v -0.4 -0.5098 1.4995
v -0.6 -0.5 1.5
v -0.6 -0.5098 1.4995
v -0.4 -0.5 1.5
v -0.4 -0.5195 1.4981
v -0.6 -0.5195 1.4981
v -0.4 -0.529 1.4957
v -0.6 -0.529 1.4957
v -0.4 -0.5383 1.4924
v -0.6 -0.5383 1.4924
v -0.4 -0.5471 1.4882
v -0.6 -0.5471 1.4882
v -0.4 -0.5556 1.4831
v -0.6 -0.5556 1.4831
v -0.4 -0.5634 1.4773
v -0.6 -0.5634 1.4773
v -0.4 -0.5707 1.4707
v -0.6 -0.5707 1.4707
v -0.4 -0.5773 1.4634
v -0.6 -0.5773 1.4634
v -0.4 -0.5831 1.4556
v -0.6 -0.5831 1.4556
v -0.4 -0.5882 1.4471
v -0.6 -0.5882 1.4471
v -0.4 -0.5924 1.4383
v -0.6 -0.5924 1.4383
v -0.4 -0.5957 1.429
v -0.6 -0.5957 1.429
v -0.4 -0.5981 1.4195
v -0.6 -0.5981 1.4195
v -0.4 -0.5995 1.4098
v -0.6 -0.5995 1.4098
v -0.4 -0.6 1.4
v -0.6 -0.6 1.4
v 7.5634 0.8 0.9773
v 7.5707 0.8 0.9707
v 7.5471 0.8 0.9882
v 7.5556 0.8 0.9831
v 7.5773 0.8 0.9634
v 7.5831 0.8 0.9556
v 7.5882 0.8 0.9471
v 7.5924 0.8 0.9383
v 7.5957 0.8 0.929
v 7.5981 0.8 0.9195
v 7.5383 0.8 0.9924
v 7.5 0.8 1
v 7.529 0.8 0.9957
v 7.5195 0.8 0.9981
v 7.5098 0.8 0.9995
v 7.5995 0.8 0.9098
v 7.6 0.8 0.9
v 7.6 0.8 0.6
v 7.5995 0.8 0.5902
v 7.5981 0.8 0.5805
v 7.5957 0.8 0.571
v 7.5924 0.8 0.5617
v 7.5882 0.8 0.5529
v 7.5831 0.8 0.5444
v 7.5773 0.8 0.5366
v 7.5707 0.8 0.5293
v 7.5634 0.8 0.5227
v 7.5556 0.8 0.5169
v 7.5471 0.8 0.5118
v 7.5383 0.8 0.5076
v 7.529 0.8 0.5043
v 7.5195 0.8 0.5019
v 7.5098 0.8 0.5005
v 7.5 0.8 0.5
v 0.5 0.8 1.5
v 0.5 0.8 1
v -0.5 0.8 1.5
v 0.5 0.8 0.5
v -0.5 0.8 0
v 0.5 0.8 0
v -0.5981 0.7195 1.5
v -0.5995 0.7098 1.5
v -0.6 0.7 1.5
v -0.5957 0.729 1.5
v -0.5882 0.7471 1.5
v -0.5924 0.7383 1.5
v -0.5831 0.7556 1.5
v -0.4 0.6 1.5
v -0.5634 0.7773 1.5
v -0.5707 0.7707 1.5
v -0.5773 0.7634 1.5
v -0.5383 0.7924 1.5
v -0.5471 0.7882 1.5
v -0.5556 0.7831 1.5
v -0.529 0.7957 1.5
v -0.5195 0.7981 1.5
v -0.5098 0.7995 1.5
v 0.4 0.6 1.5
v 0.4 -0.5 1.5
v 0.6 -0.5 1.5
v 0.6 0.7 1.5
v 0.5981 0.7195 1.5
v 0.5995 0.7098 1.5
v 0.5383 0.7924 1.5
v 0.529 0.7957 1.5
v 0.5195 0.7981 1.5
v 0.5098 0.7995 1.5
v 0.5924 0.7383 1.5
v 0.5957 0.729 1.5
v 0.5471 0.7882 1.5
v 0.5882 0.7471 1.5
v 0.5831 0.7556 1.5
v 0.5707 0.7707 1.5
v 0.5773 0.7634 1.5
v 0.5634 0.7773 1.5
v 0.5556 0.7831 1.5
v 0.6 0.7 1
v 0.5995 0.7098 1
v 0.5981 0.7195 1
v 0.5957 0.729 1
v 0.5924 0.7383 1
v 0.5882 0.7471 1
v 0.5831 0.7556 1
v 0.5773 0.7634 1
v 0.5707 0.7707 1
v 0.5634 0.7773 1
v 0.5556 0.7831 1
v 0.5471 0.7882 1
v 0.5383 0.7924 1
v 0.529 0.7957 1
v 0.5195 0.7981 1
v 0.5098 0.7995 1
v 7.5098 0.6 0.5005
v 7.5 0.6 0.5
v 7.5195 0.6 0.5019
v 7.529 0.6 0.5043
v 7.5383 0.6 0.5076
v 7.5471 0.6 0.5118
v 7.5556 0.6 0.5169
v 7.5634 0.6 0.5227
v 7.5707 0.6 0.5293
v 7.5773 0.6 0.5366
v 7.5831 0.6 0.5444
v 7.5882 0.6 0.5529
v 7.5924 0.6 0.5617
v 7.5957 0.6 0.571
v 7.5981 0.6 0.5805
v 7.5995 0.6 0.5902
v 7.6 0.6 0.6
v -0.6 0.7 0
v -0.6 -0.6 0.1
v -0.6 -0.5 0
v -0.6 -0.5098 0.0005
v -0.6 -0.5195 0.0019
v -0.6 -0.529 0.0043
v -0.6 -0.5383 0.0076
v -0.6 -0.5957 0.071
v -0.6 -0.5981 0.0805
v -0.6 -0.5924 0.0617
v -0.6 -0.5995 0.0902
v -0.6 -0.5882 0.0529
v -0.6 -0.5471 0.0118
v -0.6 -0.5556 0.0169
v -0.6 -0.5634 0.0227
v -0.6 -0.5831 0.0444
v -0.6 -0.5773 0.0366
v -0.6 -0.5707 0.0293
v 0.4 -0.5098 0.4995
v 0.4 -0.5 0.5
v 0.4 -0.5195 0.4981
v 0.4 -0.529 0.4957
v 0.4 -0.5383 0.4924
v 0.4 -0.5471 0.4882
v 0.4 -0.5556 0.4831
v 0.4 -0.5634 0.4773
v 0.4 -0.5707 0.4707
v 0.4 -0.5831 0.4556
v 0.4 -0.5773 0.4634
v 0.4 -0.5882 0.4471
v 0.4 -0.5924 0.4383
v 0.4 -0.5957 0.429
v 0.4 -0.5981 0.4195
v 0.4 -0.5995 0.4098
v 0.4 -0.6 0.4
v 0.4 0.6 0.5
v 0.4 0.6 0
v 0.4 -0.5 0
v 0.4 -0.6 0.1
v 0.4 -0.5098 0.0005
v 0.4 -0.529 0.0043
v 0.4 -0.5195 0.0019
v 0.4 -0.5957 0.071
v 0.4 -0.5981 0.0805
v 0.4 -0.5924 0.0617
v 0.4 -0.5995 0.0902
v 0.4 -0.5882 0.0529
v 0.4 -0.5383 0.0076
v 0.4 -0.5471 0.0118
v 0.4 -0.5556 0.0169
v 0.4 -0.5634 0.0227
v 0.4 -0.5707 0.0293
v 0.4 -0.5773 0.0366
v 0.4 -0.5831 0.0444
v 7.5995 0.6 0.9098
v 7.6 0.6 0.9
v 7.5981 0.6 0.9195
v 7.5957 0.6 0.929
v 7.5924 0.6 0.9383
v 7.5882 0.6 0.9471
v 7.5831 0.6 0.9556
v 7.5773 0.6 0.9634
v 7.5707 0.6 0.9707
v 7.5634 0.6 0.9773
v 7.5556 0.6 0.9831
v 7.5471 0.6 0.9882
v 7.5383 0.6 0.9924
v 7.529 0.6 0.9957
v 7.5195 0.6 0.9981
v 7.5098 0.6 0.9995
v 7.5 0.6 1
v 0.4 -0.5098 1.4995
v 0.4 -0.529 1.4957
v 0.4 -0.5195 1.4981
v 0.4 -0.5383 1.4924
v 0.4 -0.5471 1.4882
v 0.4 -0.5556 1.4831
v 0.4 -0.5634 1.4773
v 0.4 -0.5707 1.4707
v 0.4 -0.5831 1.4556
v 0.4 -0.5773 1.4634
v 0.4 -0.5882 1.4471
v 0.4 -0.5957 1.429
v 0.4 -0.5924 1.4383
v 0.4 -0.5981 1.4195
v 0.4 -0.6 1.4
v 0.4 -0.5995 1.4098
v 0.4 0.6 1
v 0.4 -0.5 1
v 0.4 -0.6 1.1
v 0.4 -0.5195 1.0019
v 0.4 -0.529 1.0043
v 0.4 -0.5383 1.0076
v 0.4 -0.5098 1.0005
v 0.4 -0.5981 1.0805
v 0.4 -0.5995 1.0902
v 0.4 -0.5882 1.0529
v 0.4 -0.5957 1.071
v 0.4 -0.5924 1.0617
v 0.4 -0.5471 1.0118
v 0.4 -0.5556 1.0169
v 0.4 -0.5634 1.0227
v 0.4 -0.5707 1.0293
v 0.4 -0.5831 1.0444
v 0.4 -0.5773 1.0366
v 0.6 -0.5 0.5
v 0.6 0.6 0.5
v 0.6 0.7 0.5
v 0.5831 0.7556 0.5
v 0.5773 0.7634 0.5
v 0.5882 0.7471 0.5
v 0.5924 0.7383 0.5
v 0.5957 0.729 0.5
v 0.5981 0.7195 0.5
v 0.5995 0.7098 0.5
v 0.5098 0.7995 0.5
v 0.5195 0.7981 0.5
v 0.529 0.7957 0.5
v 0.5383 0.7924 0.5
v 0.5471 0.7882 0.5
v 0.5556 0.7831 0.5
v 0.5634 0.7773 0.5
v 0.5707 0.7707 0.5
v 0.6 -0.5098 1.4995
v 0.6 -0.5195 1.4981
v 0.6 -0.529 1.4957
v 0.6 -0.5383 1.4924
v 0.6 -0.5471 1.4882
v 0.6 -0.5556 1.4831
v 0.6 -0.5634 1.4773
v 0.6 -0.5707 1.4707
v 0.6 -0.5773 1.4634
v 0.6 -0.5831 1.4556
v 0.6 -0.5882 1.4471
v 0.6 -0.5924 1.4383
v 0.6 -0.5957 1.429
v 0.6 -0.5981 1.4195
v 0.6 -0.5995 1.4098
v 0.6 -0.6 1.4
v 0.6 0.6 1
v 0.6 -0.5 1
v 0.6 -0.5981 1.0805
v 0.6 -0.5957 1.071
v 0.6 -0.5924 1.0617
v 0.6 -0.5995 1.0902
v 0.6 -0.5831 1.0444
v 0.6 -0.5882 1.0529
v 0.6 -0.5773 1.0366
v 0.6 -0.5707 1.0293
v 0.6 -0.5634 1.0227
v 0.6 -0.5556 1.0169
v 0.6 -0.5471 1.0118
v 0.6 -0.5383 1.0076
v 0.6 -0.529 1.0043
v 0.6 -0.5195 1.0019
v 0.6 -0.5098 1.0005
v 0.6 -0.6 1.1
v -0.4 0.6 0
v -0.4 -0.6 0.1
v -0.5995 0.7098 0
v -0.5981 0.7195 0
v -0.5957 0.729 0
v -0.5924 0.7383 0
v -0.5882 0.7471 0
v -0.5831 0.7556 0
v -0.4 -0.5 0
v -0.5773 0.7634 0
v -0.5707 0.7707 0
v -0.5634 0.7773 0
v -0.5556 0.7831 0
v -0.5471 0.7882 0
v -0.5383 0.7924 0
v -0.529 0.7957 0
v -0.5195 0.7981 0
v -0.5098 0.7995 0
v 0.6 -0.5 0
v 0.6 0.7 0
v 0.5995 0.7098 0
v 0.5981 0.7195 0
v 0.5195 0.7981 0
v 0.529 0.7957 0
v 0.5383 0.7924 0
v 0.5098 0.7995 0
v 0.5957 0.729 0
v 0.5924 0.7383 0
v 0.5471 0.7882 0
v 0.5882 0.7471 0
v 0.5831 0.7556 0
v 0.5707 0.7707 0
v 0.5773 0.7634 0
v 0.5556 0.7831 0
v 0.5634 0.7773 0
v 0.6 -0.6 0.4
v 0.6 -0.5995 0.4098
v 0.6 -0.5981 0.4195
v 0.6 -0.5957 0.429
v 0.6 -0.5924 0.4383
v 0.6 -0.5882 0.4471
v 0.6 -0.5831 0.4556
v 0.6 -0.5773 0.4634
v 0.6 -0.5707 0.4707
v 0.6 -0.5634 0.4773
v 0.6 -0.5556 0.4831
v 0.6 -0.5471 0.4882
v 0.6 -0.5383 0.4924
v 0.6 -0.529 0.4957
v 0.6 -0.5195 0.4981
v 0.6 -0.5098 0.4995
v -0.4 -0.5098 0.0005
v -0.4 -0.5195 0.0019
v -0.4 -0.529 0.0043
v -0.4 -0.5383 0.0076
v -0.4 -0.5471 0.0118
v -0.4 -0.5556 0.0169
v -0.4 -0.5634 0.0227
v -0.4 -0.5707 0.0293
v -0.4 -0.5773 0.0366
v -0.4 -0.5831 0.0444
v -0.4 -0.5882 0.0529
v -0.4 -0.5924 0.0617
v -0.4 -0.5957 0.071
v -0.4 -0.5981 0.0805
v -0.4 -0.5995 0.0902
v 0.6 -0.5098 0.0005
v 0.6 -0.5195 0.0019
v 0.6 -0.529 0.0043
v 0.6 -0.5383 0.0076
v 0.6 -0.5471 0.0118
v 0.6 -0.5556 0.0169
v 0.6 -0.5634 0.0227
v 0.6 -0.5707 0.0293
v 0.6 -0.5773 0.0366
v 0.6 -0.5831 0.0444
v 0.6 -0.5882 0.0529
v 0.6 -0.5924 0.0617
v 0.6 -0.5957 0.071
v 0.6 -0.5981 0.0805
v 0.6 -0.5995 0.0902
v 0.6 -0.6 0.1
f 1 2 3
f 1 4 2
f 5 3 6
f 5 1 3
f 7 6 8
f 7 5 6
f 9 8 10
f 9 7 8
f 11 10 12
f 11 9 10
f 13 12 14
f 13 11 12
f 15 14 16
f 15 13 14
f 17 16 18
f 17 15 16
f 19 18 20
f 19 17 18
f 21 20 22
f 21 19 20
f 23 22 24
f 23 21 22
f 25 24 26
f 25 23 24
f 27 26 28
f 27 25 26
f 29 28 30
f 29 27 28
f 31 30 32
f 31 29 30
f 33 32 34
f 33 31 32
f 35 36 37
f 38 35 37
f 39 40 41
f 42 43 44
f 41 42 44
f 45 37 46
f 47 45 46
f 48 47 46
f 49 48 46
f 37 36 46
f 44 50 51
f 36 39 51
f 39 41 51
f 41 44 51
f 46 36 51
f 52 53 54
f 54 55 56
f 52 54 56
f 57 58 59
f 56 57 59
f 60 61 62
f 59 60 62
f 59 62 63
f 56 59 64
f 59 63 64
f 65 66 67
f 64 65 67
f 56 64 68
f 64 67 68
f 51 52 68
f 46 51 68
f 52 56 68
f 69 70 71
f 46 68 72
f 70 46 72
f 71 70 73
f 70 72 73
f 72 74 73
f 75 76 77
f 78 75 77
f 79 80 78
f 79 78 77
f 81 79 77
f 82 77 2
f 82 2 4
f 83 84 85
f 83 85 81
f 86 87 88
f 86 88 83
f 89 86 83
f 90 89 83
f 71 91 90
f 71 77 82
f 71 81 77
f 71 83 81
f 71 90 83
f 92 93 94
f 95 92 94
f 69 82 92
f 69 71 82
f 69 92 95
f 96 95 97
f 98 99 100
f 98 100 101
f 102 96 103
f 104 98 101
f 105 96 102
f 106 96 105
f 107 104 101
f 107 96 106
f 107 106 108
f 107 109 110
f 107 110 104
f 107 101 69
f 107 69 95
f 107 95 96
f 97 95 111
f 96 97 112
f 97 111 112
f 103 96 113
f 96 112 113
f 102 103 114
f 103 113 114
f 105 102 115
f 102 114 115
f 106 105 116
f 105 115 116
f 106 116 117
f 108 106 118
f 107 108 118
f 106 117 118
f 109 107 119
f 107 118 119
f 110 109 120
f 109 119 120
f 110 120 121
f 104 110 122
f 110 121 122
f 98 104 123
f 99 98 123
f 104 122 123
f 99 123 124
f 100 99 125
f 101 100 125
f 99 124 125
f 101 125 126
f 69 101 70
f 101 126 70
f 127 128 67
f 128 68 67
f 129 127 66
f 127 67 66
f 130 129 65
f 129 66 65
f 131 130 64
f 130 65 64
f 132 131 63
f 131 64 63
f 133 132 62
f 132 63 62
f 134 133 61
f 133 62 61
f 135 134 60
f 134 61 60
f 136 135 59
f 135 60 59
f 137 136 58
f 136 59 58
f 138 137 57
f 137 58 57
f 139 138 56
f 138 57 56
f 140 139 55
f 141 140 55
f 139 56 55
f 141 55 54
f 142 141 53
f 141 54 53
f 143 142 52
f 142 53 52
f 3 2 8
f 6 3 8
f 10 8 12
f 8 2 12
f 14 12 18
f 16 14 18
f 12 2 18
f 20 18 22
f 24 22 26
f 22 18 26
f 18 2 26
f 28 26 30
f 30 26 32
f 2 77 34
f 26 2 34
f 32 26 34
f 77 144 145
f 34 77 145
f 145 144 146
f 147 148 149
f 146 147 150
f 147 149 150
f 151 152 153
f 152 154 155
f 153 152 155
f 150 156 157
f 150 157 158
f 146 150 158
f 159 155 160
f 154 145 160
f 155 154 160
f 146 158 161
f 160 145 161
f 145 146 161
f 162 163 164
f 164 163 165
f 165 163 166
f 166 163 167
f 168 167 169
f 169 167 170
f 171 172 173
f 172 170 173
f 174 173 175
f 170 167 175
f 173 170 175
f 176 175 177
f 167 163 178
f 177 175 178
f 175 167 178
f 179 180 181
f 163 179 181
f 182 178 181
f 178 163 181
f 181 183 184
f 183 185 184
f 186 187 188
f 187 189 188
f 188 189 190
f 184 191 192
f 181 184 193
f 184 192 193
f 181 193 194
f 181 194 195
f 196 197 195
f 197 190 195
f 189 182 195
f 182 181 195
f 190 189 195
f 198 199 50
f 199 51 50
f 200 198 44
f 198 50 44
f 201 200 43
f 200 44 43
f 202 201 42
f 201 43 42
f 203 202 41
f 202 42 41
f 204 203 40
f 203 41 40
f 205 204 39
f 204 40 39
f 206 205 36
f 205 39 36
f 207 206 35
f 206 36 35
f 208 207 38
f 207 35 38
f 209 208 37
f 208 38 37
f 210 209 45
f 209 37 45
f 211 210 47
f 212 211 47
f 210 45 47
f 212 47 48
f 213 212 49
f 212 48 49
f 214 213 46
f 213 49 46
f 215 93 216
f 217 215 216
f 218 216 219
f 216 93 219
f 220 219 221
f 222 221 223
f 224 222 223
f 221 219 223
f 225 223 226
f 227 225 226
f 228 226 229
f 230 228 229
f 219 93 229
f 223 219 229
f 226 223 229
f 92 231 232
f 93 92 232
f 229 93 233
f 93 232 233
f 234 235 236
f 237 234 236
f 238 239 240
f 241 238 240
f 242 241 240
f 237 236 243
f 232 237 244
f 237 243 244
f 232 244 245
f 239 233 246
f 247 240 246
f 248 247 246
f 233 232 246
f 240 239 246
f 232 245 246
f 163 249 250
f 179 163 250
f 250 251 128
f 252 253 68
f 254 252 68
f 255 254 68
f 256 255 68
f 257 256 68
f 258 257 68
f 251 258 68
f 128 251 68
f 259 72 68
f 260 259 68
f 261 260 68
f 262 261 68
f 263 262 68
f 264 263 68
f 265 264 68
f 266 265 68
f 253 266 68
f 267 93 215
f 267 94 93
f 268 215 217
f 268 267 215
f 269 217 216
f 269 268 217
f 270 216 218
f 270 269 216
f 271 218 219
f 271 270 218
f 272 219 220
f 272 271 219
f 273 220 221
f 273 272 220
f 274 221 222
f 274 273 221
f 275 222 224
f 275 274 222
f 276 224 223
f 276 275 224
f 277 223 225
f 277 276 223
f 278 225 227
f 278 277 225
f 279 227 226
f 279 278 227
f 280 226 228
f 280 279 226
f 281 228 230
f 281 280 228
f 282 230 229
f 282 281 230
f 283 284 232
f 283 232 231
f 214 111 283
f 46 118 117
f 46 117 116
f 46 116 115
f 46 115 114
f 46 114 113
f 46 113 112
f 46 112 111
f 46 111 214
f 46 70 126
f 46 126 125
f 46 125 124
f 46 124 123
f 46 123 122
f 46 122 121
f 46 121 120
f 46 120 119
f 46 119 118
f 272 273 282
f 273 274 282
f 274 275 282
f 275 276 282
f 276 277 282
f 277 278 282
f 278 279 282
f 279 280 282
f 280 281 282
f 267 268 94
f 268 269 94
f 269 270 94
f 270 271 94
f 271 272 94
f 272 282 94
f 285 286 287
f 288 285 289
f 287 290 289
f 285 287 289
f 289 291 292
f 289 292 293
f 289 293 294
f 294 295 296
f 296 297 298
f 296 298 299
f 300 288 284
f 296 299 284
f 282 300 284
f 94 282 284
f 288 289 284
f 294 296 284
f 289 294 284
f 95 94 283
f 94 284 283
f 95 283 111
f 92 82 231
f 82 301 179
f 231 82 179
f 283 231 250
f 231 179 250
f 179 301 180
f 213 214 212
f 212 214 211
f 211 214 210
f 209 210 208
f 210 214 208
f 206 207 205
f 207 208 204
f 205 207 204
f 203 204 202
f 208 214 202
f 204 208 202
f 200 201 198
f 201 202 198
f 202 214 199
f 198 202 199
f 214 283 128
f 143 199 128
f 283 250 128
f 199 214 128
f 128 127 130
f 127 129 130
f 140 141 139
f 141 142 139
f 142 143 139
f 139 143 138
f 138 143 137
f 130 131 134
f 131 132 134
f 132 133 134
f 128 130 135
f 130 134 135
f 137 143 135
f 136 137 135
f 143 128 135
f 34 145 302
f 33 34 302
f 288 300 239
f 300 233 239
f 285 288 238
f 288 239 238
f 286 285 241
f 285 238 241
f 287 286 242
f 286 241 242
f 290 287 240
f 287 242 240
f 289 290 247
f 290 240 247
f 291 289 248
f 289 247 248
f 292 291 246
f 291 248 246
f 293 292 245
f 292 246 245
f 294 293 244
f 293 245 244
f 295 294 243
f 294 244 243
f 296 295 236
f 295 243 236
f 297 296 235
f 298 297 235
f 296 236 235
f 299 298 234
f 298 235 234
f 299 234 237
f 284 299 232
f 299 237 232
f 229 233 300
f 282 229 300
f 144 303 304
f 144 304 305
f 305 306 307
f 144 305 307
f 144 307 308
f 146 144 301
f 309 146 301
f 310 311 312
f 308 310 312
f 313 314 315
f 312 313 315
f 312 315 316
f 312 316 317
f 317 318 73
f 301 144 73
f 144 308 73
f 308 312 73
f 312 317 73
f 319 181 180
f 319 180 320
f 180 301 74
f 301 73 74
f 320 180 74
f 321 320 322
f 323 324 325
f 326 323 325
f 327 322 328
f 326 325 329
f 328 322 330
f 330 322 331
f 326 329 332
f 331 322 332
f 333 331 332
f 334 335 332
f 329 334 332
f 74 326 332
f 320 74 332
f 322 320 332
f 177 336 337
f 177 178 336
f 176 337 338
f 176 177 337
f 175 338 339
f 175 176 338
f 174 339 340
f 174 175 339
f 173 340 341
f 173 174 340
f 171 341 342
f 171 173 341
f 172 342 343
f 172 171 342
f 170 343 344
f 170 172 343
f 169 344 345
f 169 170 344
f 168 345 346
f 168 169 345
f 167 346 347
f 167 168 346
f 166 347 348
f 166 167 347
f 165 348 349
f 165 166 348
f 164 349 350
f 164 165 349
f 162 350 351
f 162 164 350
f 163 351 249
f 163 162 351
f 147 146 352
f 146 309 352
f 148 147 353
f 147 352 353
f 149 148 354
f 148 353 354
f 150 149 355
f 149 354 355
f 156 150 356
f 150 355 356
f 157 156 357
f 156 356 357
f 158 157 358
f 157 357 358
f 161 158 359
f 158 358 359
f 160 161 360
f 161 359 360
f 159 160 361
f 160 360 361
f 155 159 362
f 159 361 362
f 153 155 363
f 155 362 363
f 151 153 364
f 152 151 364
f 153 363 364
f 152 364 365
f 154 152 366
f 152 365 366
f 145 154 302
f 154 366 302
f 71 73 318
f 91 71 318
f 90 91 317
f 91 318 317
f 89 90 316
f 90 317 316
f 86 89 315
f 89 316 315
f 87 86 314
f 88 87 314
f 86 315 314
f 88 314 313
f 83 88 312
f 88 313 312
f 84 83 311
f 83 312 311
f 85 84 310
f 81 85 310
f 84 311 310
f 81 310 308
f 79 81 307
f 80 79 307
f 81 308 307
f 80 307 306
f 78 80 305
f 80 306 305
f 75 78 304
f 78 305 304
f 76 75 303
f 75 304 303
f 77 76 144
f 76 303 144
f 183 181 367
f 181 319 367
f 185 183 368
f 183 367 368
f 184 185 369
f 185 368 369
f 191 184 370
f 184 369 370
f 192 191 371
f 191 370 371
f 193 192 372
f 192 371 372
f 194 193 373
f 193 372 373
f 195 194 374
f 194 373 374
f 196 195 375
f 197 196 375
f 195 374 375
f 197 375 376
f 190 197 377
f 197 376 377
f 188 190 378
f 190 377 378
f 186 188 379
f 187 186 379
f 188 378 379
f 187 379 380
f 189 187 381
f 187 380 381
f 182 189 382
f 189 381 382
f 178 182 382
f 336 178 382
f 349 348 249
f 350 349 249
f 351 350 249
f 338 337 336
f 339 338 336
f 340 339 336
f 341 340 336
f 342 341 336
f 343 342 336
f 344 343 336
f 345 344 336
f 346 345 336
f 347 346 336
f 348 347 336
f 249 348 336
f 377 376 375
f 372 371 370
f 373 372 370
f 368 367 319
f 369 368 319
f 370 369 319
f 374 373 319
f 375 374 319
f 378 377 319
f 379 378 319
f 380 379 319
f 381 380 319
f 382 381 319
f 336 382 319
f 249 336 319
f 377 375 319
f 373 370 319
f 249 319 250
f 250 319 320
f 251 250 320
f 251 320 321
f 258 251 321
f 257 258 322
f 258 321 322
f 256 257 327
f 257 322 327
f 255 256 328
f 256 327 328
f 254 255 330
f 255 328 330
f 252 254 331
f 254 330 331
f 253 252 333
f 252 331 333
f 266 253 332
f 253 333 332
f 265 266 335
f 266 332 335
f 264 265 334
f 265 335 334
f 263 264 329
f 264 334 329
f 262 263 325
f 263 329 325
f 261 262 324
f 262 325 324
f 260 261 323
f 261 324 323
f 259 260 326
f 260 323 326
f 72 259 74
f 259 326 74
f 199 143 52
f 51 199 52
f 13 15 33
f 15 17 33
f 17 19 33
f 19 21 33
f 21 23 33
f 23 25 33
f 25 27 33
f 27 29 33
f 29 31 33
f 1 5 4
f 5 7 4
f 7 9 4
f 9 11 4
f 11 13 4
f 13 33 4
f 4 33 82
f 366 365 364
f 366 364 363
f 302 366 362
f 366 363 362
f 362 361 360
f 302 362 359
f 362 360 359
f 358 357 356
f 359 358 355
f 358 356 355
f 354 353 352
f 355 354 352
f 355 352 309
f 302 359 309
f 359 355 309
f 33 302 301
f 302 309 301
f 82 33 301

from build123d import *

# Parameters (mm, degrees)
BOSS_EXTRUDE1_DEPTH = 1.5
BOSS_EXTRUDE3_START = -1
SKETCH5_W           = 7.6
SKETCH5_H           = 0.2
BOSS_EXTRUDE3_DEPTH = 0.5
SKETCH6_W           = 0.5
SKETCH6_H           = 1.2
CUT_EXTRUDE2_DEPTH  = 0.5
FILLET2_R           = 0.1


with BuildPart() as part:
    # Sketch1 → Boss-Extrude1 (new body)
    with BuildSketch(Plane.XY):
        with BuildLine():
            Line((-0.6, 0.7), (-0.6, -0.6))
            Line((-0.6, -0.6), (-0.4, -0.6))
            Line((-0.4, -0.6), (-0.4, 0.6))
            Line((-0.4, 0.6), (0.4, 0.6))
            Line((0.4, 0.6), (0.4, -0.6))
            Line((0.4, -0.6), (0.6, -0.6))
            Line((0.6, -0.6), (0.6, 0.7))
            ThreePointArc((0.6, 0.7), (0.570710678, 0.770710678), (0.5, 0.8))
            Line((0.5, 0.8), (-0.5, 0.8))
            ThreePointArc((-0.5, 0.8), (-0.570710678, 0.770710678), (-0.6, 0.7))
        make_face()
    extrude(amount=BOSS_EXTRUDE1_DEPTH)

    # Sketch5 → Boss-Extrude3 (add)
    with BuildSketch(Plane.XY.offset(1.5).offset(BOSS_EXTRUDE3_START)):
        with Locations((3.8, 0.7)):
            Rectangle(SKETCH5_W, SKETCH5_H)
    extrude(amount=BOSS_EXTRUDE3_DEPTH)

    # Sketch6 → Cut-Extrude2 (cut)
    with BuildSketch(Plane(origin=(0.6, 0, 0), x_dir=(0, 0, -1), z_dir=(1, 0, 0))):
        with Locations((-0.75, 0)):
            Rectangle(SKETCH6_W, SKETCH6_H)
    extrude(amount=-CUT_EXTRUDE2_DEPTH, mode=Mode.SUBTRACT)

    # Fillet2
    fillet2_edges = [part.edges().sort_by_distance(p)[0] for p in [
        (-0.5, -0.6, 0),
        (0.5, -0.6, 0),
        (-0.5, -0.6, 1.5),
        (7.6, 0.7, 1),
        (7.6, 0.7, 0.5),
        (0.5, -0.6, 0.5),
        (0.5, -0.6, 1),
        (0.5, -0.6, 1.5),
    ]]
    fillet(fillet2_edges, radius=FILLET2_R)


solid = part.part
